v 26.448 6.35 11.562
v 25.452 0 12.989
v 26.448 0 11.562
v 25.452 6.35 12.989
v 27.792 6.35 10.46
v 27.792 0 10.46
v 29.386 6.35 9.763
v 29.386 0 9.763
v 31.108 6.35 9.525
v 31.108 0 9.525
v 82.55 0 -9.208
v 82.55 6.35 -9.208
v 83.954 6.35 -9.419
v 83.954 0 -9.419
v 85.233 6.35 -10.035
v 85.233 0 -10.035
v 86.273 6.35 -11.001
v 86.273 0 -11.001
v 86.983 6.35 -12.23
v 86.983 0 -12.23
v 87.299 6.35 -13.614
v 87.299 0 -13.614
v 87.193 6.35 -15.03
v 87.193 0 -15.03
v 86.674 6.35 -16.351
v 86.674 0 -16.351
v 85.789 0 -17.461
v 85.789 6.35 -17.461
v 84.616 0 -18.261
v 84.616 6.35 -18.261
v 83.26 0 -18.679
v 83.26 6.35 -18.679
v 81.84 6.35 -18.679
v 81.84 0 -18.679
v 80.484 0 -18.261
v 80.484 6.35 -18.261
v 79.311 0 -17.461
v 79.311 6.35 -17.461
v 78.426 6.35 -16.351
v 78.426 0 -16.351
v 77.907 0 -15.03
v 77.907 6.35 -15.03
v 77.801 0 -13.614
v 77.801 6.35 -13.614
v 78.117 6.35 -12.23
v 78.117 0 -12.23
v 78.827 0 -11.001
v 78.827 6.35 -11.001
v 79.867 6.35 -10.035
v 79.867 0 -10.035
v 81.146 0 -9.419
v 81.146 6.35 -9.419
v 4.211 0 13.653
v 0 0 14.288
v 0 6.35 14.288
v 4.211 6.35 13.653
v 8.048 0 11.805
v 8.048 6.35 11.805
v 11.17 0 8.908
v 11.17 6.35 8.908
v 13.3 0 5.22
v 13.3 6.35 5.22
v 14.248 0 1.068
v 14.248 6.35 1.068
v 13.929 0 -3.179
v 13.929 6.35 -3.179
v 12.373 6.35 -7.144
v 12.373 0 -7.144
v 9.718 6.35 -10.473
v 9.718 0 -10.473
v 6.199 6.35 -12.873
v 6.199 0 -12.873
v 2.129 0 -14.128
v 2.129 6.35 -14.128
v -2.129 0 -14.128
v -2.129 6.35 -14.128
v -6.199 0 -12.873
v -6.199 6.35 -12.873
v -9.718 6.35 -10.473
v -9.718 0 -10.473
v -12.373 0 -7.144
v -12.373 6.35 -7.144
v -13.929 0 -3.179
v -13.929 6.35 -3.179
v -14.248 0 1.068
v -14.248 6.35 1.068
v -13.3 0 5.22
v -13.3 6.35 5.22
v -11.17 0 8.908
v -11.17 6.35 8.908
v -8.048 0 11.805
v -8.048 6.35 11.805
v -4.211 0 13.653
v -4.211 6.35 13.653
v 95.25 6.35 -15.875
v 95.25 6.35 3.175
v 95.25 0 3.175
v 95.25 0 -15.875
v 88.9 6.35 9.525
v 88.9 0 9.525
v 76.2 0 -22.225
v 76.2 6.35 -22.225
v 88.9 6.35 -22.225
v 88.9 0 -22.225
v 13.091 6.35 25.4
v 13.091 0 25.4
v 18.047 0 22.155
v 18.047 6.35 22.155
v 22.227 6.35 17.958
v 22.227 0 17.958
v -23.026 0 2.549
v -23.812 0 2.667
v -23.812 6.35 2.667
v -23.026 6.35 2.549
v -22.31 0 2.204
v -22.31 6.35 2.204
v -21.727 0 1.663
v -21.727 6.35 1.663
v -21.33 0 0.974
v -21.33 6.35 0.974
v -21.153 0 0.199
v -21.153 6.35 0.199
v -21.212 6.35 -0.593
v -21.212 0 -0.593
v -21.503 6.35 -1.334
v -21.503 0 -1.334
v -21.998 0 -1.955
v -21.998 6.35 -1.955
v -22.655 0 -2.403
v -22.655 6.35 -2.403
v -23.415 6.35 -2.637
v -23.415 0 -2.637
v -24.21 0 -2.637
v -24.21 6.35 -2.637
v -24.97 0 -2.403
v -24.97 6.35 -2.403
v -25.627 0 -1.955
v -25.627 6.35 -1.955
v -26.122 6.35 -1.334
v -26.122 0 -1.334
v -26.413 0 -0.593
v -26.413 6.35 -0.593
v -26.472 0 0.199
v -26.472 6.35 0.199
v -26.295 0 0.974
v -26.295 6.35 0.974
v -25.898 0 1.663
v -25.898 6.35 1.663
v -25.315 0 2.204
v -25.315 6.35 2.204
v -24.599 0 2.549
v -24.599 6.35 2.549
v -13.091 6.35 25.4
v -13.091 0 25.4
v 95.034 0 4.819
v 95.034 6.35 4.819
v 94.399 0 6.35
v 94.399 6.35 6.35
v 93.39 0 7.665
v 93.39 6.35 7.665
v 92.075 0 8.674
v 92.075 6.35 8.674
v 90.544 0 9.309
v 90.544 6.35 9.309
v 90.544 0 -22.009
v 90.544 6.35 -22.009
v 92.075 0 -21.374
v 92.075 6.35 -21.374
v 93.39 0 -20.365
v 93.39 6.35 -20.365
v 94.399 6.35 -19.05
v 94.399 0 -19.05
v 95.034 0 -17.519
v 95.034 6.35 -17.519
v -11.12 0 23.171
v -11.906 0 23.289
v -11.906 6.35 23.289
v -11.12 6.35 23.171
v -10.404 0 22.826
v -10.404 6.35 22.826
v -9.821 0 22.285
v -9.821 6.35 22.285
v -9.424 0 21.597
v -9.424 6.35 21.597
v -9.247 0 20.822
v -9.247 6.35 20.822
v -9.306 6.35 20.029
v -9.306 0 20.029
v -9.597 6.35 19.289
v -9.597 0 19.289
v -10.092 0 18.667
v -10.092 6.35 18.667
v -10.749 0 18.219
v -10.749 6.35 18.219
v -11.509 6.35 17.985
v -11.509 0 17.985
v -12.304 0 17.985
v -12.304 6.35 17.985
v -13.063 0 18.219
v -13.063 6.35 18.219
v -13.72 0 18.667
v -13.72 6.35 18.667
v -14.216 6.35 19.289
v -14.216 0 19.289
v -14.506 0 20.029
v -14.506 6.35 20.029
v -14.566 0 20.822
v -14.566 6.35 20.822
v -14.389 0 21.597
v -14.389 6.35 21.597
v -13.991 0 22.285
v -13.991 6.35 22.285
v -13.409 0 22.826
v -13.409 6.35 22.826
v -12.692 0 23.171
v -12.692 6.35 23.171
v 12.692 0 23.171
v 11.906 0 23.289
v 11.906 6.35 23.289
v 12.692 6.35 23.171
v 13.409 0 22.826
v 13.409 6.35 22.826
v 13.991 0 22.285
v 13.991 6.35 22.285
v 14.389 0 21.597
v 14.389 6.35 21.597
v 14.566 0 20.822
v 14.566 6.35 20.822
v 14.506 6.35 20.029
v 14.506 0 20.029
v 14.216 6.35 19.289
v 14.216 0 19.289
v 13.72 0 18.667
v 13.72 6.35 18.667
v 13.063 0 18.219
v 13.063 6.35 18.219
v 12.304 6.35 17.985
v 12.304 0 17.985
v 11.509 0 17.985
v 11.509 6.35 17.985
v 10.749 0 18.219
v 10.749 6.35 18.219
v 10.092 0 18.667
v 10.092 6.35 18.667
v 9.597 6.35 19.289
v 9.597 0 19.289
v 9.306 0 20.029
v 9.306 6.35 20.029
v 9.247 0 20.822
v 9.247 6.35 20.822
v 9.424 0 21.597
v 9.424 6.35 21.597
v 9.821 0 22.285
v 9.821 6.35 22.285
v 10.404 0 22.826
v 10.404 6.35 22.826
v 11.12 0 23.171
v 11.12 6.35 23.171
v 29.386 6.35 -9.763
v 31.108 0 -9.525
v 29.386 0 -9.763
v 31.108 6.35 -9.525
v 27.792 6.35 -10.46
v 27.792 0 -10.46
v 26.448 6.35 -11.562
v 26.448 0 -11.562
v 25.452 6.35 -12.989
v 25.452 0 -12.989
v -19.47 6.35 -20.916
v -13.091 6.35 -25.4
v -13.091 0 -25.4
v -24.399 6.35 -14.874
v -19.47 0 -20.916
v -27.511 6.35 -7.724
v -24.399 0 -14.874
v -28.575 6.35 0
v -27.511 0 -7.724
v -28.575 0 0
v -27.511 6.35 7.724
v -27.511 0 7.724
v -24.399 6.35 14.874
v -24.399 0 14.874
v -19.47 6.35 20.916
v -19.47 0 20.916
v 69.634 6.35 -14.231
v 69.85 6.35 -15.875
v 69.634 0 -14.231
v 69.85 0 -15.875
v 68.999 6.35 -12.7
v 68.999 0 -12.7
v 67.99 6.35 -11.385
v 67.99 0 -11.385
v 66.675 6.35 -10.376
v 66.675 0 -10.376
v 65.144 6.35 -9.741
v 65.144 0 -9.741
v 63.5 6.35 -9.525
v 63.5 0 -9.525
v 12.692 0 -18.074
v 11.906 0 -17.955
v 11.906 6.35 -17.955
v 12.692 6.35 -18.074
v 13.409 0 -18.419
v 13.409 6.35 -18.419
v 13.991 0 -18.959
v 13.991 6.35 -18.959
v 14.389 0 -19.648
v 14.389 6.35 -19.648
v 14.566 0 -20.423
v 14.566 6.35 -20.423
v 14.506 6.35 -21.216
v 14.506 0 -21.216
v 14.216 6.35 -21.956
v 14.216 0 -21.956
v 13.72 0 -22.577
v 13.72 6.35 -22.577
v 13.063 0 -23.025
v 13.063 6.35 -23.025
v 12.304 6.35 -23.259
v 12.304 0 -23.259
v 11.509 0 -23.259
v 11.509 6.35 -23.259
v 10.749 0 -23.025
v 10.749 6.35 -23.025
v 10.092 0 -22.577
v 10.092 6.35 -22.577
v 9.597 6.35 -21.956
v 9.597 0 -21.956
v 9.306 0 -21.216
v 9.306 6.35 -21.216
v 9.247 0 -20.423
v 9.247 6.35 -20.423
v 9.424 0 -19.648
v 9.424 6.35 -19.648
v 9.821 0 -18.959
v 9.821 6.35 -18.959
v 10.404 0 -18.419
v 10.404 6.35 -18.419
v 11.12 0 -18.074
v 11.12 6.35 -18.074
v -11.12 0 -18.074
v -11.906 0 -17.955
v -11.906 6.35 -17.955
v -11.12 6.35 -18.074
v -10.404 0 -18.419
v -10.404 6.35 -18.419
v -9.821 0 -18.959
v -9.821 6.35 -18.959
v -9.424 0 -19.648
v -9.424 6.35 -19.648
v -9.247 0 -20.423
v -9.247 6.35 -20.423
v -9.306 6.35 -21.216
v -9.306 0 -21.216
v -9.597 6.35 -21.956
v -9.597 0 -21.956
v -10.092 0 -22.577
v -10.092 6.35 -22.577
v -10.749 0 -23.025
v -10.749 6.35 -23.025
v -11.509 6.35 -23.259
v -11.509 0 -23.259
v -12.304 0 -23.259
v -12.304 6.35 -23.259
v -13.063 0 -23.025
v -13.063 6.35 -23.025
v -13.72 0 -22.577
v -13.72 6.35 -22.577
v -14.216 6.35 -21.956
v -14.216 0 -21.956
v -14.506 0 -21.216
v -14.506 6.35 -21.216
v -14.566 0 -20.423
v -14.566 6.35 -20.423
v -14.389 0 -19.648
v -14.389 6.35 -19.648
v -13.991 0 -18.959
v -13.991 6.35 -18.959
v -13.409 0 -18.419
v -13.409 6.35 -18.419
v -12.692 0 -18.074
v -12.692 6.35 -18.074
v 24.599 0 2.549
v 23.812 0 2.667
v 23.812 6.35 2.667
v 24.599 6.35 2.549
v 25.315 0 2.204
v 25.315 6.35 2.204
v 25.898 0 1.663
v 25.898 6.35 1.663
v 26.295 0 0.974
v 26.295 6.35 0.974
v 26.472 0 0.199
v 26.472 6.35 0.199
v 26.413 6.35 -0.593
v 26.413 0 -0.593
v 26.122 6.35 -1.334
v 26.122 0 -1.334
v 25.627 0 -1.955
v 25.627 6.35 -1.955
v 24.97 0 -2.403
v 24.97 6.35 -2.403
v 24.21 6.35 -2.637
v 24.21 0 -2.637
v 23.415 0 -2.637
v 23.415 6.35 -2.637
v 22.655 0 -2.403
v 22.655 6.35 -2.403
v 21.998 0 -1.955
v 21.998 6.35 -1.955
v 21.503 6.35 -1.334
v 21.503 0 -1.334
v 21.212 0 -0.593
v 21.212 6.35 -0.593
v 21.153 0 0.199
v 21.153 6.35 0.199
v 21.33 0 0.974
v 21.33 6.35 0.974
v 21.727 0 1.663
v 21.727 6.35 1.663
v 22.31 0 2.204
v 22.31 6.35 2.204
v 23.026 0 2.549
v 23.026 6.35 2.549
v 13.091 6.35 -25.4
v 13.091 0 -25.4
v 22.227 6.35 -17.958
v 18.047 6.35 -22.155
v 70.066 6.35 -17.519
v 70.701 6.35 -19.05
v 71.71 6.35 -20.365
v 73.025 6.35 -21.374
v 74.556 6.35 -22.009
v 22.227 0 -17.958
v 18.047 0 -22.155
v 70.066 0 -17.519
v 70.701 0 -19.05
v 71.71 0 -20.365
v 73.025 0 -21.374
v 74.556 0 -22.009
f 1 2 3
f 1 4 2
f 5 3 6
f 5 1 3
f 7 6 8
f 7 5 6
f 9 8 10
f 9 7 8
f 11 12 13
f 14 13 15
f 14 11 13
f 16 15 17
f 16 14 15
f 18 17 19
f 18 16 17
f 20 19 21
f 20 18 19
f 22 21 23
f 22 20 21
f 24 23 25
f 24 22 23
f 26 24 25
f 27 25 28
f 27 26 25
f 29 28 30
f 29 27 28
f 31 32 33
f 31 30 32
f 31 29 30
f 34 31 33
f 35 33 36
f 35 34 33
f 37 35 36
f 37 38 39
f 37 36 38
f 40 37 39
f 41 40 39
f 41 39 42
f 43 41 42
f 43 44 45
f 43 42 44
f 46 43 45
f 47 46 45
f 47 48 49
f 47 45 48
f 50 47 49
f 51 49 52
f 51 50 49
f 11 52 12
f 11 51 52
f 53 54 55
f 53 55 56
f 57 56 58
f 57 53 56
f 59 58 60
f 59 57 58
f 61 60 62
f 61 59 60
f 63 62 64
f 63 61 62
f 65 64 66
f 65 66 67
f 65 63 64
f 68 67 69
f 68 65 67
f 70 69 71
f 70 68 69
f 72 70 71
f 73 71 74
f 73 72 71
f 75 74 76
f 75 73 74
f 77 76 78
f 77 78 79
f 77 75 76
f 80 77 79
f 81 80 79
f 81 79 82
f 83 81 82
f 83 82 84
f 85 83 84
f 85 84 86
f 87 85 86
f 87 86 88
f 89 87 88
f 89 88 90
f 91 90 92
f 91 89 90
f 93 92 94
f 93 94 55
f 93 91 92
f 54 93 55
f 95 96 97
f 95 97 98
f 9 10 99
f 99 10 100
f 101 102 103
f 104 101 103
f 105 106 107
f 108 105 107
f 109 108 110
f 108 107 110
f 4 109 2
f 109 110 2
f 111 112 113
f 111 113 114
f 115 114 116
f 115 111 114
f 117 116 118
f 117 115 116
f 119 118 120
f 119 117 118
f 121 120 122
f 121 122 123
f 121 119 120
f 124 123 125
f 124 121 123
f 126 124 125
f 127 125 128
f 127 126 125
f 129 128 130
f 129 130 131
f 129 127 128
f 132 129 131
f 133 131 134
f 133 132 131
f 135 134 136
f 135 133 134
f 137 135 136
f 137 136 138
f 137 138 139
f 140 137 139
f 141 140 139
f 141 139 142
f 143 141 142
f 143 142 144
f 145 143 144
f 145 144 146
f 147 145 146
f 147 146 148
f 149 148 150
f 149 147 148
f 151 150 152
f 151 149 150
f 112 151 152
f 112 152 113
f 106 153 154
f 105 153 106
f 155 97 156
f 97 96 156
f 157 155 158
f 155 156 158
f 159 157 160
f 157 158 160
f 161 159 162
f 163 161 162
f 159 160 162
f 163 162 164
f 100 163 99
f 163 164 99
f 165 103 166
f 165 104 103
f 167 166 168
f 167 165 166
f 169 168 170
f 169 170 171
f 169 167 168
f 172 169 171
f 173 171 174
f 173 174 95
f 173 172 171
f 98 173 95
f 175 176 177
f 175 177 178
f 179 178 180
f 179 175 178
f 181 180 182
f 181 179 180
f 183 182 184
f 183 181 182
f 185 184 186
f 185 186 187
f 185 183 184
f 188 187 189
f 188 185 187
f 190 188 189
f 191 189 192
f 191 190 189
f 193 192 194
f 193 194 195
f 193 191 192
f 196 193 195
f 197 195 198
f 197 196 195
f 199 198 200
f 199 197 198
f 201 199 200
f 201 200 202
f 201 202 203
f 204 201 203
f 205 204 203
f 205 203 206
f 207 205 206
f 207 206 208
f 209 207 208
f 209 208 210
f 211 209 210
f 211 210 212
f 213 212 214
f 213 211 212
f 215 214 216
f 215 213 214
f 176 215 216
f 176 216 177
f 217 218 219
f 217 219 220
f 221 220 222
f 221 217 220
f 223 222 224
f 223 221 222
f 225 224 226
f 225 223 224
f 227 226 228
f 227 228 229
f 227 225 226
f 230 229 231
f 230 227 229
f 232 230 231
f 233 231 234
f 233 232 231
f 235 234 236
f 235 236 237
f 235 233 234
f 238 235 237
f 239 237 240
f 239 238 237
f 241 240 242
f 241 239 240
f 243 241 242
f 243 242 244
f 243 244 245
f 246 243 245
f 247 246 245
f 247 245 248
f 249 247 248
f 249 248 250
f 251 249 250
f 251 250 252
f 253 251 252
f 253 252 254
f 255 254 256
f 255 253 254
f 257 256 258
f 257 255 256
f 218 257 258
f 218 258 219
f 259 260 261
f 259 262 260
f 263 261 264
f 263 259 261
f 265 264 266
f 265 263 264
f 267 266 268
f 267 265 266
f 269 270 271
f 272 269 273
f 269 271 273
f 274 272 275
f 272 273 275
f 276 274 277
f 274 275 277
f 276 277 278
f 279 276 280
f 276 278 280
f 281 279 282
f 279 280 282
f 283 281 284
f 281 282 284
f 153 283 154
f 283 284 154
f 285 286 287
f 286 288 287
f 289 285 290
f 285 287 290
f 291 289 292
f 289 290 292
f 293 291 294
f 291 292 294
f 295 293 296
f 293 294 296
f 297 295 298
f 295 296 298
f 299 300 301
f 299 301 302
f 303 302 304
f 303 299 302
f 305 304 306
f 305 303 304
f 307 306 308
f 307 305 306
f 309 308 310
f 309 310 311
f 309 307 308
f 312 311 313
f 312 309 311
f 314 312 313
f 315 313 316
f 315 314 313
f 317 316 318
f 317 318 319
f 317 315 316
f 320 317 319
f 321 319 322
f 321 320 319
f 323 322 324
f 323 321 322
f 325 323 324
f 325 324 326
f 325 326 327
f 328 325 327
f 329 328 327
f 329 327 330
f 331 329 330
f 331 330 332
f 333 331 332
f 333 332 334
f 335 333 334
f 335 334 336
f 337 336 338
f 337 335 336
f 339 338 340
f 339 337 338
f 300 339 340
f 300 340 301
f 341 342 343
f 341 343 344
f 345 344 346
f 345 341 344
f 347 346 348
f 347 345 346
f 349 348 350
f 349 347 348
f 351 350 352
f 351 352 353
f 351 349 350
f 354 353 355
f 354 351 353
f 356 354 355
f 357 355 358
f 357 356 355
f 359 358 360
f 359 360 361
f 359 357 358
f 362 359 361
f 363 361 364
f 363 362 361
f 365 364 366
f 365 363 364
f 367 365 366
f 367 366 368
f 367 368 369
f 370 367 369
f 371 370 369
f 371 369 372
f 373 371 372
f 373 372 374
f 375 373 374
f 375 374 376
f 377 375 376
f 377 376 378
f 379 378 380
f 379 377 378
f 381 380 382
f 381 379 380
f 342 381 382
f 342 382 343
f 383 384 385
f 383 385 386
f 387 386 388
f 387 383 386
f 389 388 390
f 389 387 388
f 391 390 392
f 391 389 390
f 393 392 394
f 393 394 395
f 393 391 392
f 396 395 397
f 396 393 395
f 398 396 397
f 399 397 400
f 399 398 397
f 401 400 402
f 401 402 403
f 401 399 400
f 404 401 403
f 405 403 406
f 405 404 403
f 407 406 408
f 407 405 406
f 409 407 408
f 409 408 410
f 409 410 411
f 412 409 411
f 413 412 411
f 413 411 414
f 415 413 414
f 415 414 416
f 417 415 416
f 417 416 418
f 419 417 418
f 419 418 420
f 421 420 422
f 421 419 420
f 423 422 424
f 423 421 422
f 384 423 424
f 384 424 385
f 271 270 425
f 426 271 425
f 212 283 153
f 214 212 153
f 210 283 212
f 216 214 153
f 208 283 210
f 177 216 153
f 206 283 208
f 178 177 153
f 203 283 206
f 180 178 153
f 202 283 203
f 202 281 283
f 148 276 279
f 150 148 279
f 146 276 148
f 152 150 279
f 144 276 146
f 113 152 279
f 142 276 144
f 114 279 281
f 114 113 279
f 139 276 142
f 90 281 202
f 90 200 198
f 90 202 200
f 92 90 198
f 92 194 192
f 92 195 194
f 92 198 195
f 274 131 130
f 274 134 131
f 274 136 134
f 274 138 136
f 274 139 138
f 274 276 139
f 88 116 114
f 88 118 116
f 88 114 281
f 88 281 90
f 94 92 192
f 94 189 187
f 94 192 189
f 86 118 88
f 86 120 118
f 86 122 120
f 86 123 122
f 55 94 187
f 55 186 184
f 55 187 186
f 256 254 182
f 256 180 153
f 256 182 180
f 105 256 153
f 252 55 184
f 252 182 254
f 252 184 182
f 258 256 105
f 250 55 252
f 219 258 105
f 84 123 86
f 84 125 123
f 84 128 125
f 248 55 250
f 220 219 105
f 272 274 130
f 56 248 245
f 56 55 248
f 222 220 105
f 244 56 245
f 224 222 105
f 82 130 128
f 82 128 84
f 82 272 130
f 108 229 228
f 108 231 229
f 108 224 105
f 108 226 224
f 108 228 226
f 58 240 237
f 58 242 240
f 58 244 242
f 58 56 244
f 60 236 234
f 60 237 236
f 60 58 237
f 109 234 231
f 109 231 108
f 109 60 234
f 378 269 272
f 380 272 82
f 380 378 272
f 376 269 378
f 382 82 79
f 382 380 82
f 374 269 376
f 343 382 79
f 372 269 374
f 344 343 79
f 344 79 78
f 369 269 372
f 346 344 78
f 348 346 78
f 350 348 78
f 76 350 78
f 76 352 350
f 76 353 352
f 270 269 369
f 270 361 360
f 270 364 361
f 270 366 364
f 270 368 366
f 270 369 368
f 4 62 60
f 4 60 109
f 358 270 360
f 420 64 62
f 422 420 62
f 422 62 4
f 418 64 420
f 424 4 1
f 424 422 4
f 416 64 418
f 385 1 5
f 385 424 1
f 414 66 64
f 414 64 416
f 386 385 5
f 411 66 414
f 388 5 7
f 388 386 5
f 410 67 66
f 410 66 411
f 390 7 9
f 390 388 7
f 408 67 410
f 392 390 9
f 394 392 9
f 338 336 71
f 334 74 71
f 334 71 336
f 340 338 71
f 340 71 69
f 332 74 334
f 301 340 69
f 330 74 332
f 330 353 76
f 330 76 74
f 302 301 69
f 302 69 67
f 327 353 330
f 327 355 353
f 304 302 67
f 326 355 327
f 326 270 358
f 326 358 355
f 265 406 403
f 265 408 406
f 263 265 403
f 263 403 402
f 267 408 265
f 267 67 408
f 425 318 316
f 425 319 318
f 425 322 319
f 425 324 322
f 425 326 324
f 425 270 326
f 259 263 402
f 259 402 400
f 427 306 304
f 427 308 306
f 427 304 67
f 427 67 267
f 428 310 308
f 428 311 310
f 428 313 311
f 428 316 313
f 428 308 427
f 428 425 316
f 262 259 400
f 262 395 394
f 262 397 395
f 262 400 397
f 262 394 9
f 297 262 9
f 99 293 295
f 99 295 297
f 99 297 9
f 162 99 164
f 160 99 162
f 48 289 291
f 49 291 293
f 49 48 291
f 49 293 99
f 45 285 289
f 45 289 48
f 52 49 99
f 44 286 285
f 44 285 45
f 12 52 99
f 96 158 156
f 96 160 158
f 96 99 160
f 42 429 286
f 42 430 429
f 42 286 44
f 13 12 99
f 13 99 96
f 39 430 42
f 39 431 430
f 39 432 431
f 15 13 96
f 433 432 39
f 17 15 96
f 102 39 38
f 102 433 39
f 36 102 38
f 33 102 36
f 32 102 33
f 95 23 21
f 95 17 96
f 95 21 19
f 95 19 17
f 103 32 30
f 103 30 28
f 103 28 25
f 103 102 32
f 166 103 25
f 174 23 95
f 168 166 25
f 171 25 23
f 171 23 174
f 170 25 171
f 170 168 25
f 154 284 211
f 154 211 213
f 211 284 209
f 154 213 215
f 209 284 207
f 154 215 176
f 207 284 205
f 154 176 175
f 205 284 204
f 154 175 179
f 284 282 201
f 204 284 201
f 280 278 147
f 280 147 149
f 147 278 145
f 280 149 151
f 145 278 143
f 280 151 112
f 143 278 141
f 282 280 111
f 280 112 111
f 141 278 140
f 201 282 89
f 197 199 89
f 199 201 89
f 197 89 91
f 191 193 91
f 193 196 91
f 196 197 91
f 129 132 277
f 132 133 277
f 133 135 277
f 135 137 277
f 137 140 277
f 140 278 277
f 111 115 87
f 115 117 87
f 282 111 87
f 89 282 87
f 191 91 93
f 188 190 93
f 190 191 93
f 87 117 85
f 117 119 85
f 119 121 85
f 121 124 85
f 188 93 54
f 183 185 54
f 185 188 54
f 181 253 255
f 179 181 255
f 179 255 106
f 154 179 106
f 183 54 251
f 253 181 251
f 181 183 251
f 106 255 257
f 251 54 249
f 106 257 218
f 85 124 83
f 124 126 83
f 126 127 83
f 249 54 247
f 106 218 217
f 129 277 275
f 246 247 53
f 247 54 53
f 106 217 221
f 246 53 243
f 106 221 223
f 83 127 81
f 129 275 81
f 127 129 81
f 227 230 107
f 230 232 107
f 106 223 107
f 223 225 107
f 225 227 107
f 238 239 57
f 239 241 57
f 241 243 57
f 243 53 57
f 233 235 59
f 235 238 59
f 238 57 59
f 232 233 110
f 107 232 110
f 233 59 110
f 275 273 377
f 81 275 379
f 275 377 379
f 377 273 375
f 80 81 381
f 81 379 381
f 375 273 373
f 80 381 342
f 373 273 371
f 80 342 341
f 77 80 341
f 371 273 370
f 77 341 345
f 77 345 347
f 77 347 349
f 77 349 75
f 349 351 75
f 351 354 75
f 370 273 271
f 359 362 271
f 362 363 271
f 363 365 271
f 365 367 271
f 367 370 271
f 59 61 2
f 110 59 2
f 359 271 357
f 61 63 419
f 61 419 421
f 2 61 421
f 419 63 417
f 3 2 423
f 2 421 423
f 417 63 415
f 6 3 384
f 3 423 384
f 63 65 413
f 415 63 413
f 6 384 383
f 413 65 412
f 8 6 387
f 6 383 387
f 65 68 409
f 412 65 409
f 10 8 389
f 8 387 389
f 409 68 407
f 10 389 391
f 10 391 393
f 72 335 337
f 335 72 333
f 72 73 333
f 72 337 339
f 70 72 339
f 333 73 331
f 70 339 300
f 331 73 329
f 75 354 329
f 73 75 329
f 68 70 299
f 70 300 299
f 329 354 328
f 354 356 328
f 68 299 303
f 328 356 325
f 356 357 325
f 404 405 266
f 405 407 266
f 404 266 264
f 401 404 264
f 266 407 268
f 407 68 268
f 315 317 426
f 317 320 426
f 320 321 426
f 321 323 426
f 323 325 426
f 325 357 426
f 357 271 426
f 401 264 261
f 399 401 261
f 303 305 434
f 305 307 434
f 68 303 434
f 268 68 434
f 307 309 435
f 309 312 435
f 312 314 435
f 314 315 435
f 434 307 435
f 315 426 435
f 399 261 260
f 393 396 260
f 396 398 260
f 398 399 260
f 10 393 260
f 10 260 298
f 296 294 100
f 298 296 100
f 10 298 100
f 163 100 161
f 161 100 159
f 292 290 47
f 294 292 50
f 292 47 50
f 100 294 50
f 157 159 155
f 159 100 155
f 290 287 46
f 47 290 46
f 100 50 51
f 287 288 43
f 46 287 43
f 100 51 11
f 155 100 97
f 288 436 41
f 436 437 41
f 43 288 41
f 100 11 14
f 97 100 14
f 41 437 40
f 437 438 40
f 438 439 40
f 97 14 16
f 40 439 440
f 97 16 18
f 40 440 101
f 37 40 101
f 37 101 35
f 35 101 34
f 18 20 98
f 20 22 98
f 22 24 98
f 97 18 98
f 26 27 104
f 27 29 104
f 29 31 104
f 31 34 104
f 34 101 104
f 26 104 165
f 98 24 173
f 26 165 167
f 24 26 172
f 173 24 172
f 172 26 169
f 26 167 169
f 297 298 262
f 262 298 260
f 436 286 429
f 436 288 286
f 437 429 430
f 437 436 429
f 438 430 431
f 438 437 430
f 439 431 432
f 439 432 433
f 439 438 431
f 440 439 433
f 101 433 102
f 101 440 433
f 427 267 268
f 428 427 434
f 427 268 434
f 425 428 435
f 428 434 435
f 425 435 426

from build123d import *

# Parameters (mm, degrees)
SKETCH1_R           = 28.575
SKETCH1_R_2         = 14.2875
SKETCH1_R_3         = 2.667
BOSS_EXTRUDE1_DEPTH = 6.35
BOSS_EXTRUDE2_DEPTH = 6.35
SKETCH3_W           = 25.4
SKETCH3_H           = 12.7
BOSS_EXTRUDE3_DEPTH = 6.35
CUT_EXTRUDE4_REACH  = 101.646
SKETCH4_R           = 4.7625
FILLET1_R           = 6.35
SKETCH5_W           = 86.18949407
SKETCH5_H           = 10.684979127
CUT_EXTRUDE5_DEPTH  = 100.646453148


with BuildPart() as part:
    # Sketch1 → Boss-Extrude1 (new body)
    with BuildSketch(Plane(origin=(0, 0, 0), x_dir=(1, 0, 0), z_dir=(0, 1, 0))):
        with Locations(Location((0, 0, 0), (0, 0, 270))):
            Circle(SKETCH1_R)
        with Locations(Location((0, 0, 0), (0, 0, 270))):
            Circle(SKETCH1_R_2, mode=Mode.SUBTRACT)
        with Locations(Location((11.90625, 20.622229928, 0), (0, 0, 270))):
            Circle(SKETCH1_R_3, mode=Mode.SUBTRACT)
        with Locations(Location((23.8125, 0, 0), (0, 0, 270))):
            Circle(SKETCH1_R_3, mode=Mode.SUBTRACT)
        with Locations(Location((11.90625, -20.622229928, 0), (0, 0, 270))):
            Circle(SKETCH1_R_3, mode=Mode.SUBTRACT)
        with Locations(Location((-11.90625, -20.622229928, 0), (0, 0, 270))):
            Circle(SKETCH1_R_3, mode=Mode.SUBTRACT)
        with Locations(Location((-23.8125, 0, 0), (0, 0, 270))):
            Circle(SKETCH1_R_3, mode=Mode.SUBTRACT)
        with Locations(Location((-11.90625, 20.622229928, 0), (0, 0, 270))):
            Circle(SKETCH1_R_3, mode=Mode.SUBTRACT)
    extrude(amount=BOSS_EXTRUDE1_DEPTH)

    # Sketch2 → Boss-Extrude2 (add)
    with BuildSketch(Plane(origin=(0, 0, 0), x_dir=(1, 0, 0), z_dir=(0, 1, 0))):
        with BuildLine():
            Line((26.940768363, -9.525), (95.25, -9.525))
            Line((95.25, -9.525), (95.25, 9.525))
            Line((95.25, 9.525), (26.940768363, 9.525))
            ThreePointArc((26.940768363, 9.525), (28.575, 0), (26.940768363, -9.525))
        make_face()
    extrude(amount=BOSS_EXTRUDE2_DEPTH)

    # Sketch3 → Boss-Extrude3 (add)
    with BuildSketch(Plane(origin=(0, 6.35, 0), x_dir=(1, 0, 0), z_dir=(0, 1, 0))):
        with Locations((82.55, 15.875)):
            Rectangle(SKETCH3_W, SKETCH3_H)
    extrude(amount=-BOSS_EXTRUDE3_DEPTH)

    # Sketch4 → Cut-Extrude4 (cut, up to next)
    with BuildSketch(Plane(origin=(0, 0, 0), x_dir=(1, 0, 0), z_dir=(0, 1, 0)), mode=Mode.PRIVATE) as cut_extrude4_sk1:
        with Locations(Location((82.55, 13.97, 0), (0, 0, 270))):
            Circle(SKETCH4_R)
    cut_extrude4_tool1 = extrude(cut_extrude4_sk1.sketch, amount=CUT_EXTRUDE4_REACH, mode=Mode.PRIVATE) & part.part
    add(cut_extrude4_tool1.solids().sort_by_distance((82.55, 0, -13.97))[0], mode=Mode.SUBTRACT)

    # Fillet1
    fillet1_edges = [part.edges().sort_by_distance(p)[0] for p in [
        (69.85, 3.175, -9.525),
        (95.25, 3.175, 9.525),
        (69.85, 3.175, -22.225),
        (95.25, 3.175, -22.225),
        (26.940768363, 3.175, 9.525),
        (26.940768363, 3.175, -9.525),
    ]]
    fillet(fillet1_edges, radius=FILLET1_R - 0.0001)  # a hair under: the kernel refuses the full size

    # Sketch5 → Cut-Extrude5 (cut, through all)
    with BuildSketch(Plane(origin=(0, 6.35, 0), x_dir=(1, 0, 0), z_dir=(0, 1, 0))):
        with Locations((4.822558491, 30.742489564)):
            Rectangle(SKETCH5_W, SKETCH5_H)
        with Locations((4.822558491, -30.742489564)):
            Rectangle(SKETCH5_W, SKETCH5_H)
    extrude(amount=-CUT_EXTRUDE5_DEPTH, mode=Mode.SUBTRACT)


solid = part.part
